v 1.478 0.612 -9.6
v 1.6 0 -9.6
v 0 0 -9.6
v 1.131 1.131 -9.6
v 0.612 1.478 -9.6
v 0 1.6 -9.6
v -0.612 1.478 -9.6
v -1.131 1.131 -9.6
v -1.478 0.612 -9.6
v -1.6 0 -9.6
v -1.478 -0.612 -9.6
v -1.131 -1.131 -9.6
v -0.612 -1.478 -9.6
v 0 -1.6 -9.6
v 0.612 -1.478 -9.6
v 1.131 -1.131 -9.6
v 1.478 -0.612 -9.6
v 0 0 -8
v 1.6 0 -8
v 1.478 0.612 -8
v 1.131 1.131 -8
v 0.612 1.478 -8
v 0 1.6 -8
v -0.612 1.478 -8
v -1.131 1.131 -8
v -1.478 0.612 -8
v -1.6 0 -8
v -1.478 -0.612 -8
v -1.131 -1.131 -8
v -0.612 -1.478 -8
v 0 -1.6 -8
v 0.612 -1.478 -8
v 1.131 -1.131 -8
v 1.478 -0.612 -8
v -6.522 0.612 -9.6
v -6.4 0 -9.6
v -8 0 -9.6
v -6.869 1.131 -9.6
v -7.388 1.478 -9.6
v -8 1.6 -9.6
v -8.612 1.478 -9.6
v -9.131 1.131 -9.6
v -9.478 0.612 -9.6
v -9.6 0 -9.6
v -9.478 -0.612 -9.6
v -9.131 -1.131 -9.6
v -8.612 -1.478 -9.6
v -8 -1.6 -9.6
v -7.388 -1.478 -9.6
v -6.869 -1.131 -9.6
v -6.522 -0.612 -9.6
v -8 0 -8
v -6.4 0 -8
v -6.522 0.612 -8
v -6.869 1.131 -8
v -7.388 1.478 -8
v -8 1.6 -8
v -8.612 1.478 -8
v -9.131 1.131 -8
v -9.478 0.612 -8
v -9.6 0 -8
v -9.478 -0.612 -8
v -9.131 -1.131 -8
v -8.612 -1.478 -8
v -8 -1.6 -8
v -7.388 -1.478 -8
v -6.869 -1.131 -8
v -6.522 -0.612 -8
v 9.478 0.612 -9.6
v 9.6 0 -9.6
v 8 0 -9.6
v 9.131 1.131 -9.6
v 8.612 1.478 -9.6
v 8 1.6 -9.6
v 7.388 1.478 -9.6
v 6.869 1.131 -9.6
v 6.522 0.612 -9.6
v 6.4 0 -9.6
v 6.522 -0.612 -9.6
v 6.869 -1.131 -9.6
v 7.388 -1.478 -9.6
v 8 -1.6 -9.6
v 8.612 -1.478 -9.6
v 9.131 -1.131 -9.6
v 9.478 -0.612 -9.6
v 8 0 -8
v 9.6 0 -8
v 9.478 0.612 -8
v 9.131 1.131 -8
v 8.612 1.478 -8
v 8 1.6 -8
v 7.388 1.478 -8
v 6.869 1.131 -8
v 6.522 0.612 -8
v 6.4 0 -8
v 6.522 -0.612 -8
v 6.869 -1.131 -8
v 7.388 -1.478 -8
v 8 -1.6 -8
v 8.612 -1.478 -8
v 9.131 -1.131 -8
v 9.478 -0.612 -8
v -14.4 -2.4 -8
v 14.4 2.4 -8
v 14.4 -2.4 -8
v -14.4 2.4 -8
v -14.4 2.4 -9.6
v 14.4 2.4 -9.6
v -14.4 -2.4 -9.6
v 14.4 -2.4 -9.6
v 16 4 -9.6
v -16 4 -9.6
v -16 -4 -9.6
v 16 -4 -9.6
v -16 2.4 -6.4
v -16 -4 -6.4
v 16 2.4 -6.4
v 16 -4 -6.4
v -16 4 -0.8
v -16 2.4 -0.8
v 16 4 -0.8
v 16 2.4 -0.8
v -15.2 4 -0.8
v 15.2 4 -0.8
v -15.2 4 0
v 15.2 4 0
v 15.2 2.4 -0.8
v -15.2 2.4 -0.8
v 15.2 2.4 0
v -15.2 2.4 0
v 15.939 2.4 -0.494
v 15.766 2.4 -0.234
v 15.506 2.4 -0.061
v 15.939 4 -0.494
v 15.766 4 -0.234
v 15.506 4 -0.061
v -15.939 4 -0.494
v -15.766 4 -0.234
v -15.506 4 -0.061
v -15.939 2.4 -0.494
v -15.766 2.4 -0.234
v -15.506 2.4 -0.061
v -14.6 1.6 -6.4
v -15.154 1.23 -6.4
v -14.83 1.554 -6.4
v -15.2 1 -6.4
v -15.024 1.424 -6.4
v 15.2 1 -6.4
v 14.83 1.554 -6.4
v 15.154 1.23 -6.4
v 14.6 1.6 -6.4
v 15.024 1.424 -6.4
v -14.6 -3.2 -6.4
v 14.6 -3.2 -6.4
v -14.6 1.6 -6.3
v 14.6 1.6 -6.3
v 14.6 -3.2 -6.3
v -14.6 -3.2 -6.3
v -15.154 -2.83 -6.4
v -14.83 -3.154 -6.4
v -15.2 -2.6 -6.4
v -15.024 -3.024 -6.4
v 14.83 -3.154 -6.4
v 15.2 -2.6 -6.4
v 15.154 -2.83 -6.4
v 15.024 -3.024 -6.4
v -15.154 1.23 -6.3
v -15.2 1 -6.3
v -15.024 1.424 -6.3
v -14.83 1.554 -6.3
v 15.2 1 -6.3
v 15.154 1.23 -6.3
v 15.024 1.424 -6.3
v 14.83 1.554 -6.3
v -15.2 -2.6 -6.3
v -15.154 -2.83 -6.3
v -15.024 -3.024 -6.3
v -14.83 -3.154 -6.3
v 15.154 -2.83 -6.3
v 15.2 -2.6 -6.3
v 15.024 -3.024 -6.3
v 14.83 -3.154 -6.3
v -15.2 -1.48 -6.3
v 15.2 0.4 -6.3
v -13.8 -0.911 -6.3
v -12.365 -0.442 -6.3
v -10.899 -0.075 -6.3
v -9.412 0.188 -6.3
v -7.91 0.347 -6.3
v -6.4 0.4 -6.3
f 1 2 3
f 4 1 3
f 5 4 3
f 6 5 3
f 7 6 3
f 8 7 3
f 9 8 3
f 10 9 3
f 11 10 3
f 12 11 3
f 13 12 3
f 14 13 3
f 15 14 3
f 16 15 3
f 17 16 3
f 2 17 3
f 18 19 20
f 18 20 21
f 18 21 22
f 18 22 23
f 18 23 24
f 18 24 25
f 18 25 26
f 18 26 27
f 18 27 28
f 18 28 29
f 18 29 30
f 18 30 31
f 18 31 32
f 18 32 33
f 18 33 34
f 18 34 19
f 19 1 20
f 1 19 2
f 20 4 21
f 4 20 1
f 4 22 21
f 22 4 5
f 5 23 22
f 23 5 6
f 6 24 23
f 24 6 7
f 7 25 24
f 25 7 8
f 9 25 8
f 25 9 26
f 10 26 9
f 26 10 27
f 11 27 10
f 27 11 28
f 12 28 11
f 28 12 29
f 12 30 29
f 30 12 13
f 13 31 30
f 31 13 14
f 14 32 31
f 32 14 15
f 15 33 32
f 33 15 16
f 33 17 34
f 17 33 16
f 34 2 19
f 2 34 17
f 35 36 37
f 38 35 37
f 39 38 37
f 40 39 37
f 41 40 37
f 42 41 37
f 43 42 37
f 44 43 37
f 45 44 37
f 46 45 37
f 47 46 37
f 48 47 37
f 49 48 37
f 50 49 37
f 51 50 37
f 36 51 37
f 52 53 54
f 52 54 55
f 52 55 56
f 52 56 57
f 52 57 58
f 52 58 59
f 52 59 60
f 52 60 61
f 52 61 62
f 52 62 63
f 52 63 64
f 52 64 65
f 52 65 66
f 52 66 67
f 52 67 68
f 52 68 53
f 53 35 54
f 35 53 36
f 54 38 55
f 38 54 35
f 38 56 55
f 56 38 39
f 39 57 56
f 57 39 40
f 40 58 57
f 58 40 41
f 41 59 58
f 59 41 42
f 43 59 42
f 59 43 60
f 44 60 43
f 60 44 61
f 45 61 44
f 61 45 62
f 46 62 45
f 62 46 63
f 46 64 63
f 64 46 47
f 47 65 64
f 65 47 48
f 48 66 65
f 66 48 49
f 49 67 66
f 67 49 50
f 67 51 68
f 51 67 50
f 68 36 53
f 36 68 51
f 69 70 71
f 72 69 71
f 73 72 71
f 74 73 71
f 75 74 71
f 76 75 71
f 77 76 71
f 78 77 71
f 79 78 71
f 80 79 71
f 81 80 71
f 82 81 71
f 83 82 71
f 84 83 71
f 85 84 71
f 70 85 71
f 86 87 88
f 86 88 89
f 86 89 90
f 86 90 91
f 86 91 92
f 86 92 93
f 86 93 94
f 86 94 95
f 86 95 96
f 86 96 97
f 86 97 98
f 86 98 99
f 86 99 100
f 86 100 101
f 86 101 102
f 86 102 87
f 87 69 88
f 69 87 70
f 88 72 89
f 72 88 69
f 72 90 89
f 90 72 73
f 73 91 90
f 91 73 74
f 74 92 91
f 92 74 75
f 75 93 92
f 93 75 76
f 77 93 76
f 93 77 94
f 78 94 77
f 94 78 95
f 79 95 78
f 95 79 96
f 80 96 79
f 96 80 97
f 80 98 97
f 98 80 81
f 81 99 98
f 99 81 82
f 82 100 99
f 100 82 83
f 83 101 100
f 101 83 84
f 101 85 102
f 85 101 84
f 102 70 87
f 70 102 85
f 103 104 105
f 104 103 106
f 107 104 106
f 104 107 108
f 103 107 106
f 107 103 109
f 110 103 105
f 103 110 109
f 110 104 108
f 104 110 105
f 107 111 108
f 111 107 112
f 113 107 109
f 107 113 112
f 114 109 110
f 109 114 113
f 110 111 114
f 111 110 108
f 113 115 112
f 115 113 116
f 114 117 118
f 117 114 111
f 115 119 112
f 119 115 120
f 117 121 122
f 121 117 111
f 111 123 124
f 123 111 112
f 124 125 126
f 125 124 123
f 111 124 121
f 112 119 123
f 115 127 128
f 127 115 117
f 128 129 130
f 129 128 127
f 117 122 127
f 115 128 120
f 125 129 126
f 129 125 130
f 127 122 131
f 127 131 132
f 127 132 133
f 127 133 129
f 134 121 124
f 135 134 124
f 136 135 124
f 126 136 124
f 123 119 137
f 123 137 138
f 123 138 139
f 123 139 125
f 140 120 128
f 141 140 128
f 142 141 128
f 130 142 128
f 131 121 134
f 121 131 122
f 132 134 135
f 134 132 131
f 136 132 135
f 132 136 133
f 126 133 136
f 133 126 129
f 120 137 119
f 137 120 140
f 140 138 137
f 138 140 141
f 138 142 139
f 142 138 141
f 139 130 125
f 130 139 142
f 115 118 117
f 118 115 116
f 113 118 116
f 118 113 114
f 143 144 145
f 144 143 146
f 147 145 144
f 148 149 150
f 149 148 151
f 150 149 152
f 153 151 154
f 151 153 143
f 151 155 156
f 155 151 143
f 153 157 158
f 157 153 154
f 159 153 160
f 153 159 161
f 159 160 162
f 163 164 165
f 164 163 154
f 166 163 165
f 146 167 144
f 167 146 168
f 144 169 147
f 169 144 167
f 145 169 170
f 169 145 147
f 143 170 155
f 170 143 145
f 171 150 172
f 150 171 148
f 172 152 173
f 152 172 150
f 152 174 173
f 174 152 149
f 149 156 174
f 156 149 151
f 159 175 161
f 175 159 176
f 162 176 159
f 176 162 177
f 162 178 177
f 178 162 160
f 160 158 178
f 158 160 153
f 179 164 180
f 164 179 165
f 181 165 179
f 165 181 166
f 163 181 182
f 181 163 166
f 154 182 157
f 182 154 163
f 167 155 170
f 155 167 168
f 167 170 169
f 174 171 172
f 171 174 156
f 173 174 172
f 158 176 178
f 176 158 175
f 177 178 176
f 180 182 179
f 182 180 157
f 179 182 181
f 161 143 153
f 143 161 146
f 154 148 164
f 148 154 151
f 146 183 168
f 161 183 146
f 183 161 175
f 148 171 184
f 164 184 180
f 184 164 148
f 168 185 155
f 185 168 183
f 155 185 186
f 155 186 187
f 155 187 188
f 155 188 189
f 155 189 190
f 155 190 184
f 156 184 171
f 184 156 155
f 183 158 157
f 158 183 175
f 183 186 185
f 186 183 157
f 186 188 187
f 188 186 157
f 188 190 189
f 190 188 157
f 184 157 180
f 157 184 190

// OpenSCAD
// file: ../p/4-4edge.scad
use <../lib.scad>
function ldraw_lib__4_4edge() = [
// 0 Circle 1.0
// 0 Name: 4-4edge.dat
// 0 Author: James Jessiman
// 0 !LDRAW_ORG Primitive UPDATE 2017-01
// 0 !LICENSE Licensed under CC BY 2.0 and CC BY 4.0 : see CAreadme.txt
// 
// 0 BFC CERTIFY CCW
  [0,"BFC","CERTIFY"],
  [0,"BFC","CCW"],
// 
// 0 !HISTORY 1998-12-15 [PTadmin] Official Update 1998-10
// 0 !HISTORY 2005-12-28 [PTadmin] Official Update 2005-01
// 0 !HISTORY 2007-06-24 [PTadmin] Header formatted for Contributor Agreement
// 0 !HISTORY 2008-07-01 [PTadmin] Official Update 2008-01
// 0 !HISTORY 2017-01-15 [Steffen] BFCed
// 0 !HISTORY 2017-12-30 [PTadmin] Official Update 2017-01
// 
// 
// 2 24 1 0 0 0.9239 0 0.3827
  [2,24,1,0,0,0.9239,0,0.3827],
// 2 24 0.9239 0 0.3827 0.7071 0 0.7071
  [2,24,0.9239,0,0.3827,0.7071,0,0.7071],
// 2 24 0.7071 0 0.7071 0.3827 0 0.9239
  [2,24,0.7071,0,0.7071,0.3827,0,0.9239],
// 2 24 0.3827 0 0.9239 0 0 1
  [2,24,0.3827,0,0.9239,0,0,1],
// 2 24 0 0 1 -0.3827 0 0.9239
  [2,24,0,0,1,-0.3827,0,0.9239],
// 2 24 -0.3827 0 0.9239 -0.7071 0 0.7071
  [2,24,-0.3827,0,0.9239,-0.7071,0,0.7071],
// 2 24 -0.7071 0 0.7071 -0.9239 0 0.3827
  [2,24,-0.7071,0,0.7071,-0.9239,0,0.3827],
// 2 24 -0.9239 0 0.3827 -1 0 -0
  [2,24,-0.9239,0,0.3827,-1,0,-0],
// 2 24 -1 0 -0 -0.9239 0 -0.3827
  [2,24,-1,0,-0,-0.9239,0,-0.3827],
// 2 24 -0.9239 0 -0.3827 -0.7071 0 -0.7071
  [2,24,-0.9239,0,-0.3827,-0.7071,0,-0.7071],
// 2 24 -0.7071 0 -0.7071 -0.3827 0 -0.9239
  [2,24,-0.7071,0,-0.7071,-0.3827,0,-0.9239],
// 2 24 -0.3827 0 -0.9239 0 0 -1
  [2,24,-0.3827,0,-0.9239,0,0,-1],
// 2 24 0 0 -1 0.3827 0 -0.9239
  [2,24,0,0,-1,0.3827,0,-0.9239],
// 2 24 0.3827 0 -0.9239 0.7071 0 -0.7071
  [2,24,0.3827,0,-0.9239,0.7071,0,-0.7071],
// 2 24 0.7071 0 -0.7071 0.9239 0 -0.3827
  [2,24,0.7071,0,-0.7071,0.9239,0,-0.3827],
// 2 24 0.9239 0 -0.3827 1 0 0
  [2,24,0.9239,0,-0.3827,1,0,0],
];
module ldraw_lib__4_4edge(step=0, col=false, unit=2/5, alt=false, line=0.2, solid=!$preview)
    makepoly(ldraw_lib__4_4edge(), step=step, col=col, unit=unit, alt=alt, line=line, solid=solid);
ldraw_lib__4_4edge(line=0.2);
// file: ../p/4-4disc.scad
use <../lib.scad>
function ldraw_lib__4_4disc() = [
// 0 Disc 1.0
// 0 Name: 4-4disc.dat
// 0 Author: James Jessiman
// 0 !LDRAW_ORG Primitive UPDATE 2002-02
// 0 !LICENSE Licensed under CC BY 2.0 and CC BY 4.0 : see CAreadme.txt
// 
// 0 BFC CERTIFY CCW
  [0,"BFC","CERTIFY"],
  [0,"BFC","CCW"],
// 
// 0 !HISTORY 1998-12-15 [PTadmin] Official Update 1998-10
// 0 !HISTORY 2002-03-23 [sbliss] Added BFC statement
// 0 !HISTORY 2002-04-25 [PTadmin] Official Update 2002-02
// 0 !HISTORY 2007-06-24 [PTadmin] Header formatted for Contributor Agreement
// 0 !HISTORY 2008-07-01 [PTadmin] Official Update 2008-01
// 
// 
// 3 16 0 0 0 1 0 0 0.9239 0 0.3827
  [3,16,0,0,0,1,0,0,0.9239,0,0.3827],
// 3 16 0 0 0 0.9239 0 0.3827 0.7071 0 0.7071
  [3,16,0,0,0,0.9239,0,0.3827,0.7071,0,0.7071],
// 3 16 0 0 0 0.7071 0 0.7071 0.3827 0 0.9239
  [3,16,0,0,0,0.7071,0,0.7071,0.3827,0,0.9239],
// 3 16 0 0 0 0.3827 0 0.9239 0 0 1
  [3,16,0,0,0,0.3827,0,0.9239,0,0,1],
// 3 16 0 0 0 0 0 1 -0.3827 0 0.9239
  [3,16,0,0,0,0,0,1,-0.3827,0,0.9239],
// 3 16 0 0 0 -0.3827 0 0.9239 -0.7071 0 0.7071
  [3,16,0,0,0,-0.3827,0,0.9239,-0.7071,0,0.7071],
// 3 16 0 0 0 -0.7071 0 0.7071 -0.9239 0 0.3827
  [3,16,0,0,0,-0.7071,0,0.7071,-0.9239,0,0.3827],
// 3 16 0 0 0 -0.9239 0 0.3827 -1 0 -0
  [3,16,0,0,0,-0.9239,0,0.3827,-1,0,-0],
// 3 16 0 0 0 -1 0 -0 -0.9239 0 -0.3827
  [3,16,0,0,0,-1,0,-0,-0.9239,0,-0.3827],
// 3 16 0 0 0 -0.9239 0 -0.3827 -0.7071 0 -0.7071
  [3,16,0,0,0,-0.9239,0,-0.3827,-0.7071,0,-0.7071],
// 3 16 0 0 0 -0.7071 0 -0.7071 -0.3827 0 -0.9239
  [3,16,0,0,0,-0.7071,0,-0.7071,-0.3827,0,-0.9239],
// 3 16 0 0 0 -0.3827 0 -0.9239 0 0 -1
  [3,16,0,0,0,-0.3827,0,-0.9239,0,0,-1],
// 3 16 0 0 0 0 0 -1 0.3827 0 -0.9239
  [3,16,0,0,0,0,0,-1,0.3827,0,-0.9239],
// 3 16 0 0 0 0.3827 0 -0.9239 0.7071 0 -0.7071
  [3,16,0,0,0,0.3827,0,-0.9239,0.7071,0,-0.7071],
// 3 16 0 0 0 0.7071 0 -0.7071 0.9239 0 -0.3827
  [3,16,0,0,0,0.7071,0,-0.7071,0.9239,0,-0.3827],
// 3 16 0 0 0 0.9239 0 -0.3827 1 0 0
  [3,16,0,0,0,0.9239,0,-0.3827,1,0,0],
// 0
];
module ldraw_lib__4_4disc(step=0, col=false, unit=2/5, alt=false, line=0.2, solid=!$preview)
    makepoly(ldraw_lib__4_4disc(), step=step, col=col, unit=unit, alt=alt, line=line, solid=solid);
ldraw_lib__4_4disc(line=0.2);
// file: ../p/4-4cyli.scad
use <../lib.scad>
$fa=1; $fs=0.2;
function ldraw_lib__4_4cyli(realsolid=false) = [
// 0 Cylinder 1.0
// 0 Name: 4-4cyli.dat
// 0 Author: James Jessiman
// 0 !LDRAW_ORG Primitive UPDATE 2005-01
// 0 !LICENSE Licensed under CC BY 2.0 and CC BY 4.0 : see CAreadme.txt
// 
// 0 BFC CERTIFY CCW
  [0,"BFC","CERTIFY"],
  [0,"BFC","CCW"],
// 
// 0 !HISTORY 1998-12-15 [PTadmin] Official Update 1998-10
// 0 !HISTORY 2002-03-23 [sbliss] Added BFC statement; merged headers from files in distributions LDraw 0.27 and Complete.
// 0 !HISTORY 2002-04-25 [PTadmin] Official Update 2002-02
// 0 !HISTORY 2004-12-14 [guyvivan] BFC CCW
// 0 !HISTORY 2005-12-28 [PTadmin] Official Update 2005-01
// 0 !HISTORY 2007-06-24 [PTadmin] Header formatted for Contributor Agreement
// 0 !HISTORY 2008-07-01 [PTadmin] Official Update 2008-01
// 
// 
// 4 16 1 1 0 0.9239 1 0.3827 0.9239 0 0.3827 1 0 0
  [4,16,1,1,0,0.9239,1,0.3827,0.9239,0,0.3827,1,0,0],
// 5 24 1 0 0 1 1 0 0.9239 0 0.3827 0.9239 0 -0.3827
  [5,24,1,0,0,1,1,0,0.9239,0,0.3827,0.9239,0,-0.3827],
// 4 16 0.9239 1 0.3827 0.7071 1 0.7071 0.7071 0 0.7071 0.9239 0 0.3827
  [4,16,0.9239,1,0.3827,0.7071,1,0.7071,0.7071,0,0.7071,0.9239,0,0.3827],
// 5 24 0.9239 0 0.3827 0.9239 1 0.3827 0.7071 0 0.7071 1 0 0
  [5,24,0.9239,0,0.3827,0.9239,1,0.3827,0.7071,0,0.7071,1,0,0],
// 4 16 0.7071 1 0.7071 0.3827 1 0.9239 0.3827 0 0.9239 0.7071 0 0.7071
  [4,16,0.7071,1,0.7071,0.3827,1,0.9239,0.3827,0,0.9239,0.7071,0,0.7071],
// 5 24 0.7071 0 0.7071 0.7071 1 0.7071 0.3827 0 0.9239 0.9239 0 0.3827
  [5,24,0.7071,0,0.7071,0.7071,1,0.7071,0.3827,0,0.9239,0.9239,0,0.3827],
// 4 16 0.3827 1 0.9239 0 1 1 0 0 1 0.3827 0 0.9239
  [4,16,0.3827,1,0.9239,0,1,1,0,0,1,0.3827,0,0.9239],
// 5 24 0.3827 0 0.9239 0.3827 1 0.9239 0 0 1 0.7071 0 0.7071
  [5,24,0.3827,0,0.9239,0.3827,1,0.9239,0,0,1,0.7071,0,0.7071],
// 4 16 0 1 1 -0.3827 1 0.9239 -0.3827 0 0.9239 0 0 1
  [4,16,0,1,1,-0.3827,1,0.9239,-0.3827,0,0.9239,0,0,1],
// 5 24 0 0 1 0 1 1 -0.3827 0 0.9239 0.3827 0 0.9239
  [5,24,0,0,1,0,1,1,-0.3827,0,0.9239,0.3827,0,0.9239],
// 4 16 -0.3827 1 0.9239 -0.7071 1 0.7071 -0.7071 0 0.7071 -0.3827 0 0.9239
  [4,16,-0.3827,1,0.9239,-0.7071,1,0.7071,-0.7071,0,0.7071,-0.3827,0,0.9239],
// 5 24 -0.3827 0 0.9239 -0.3827 1 0.9239 -0.7071 0 0.7071 0 0 1
  [5,24,-0.3827,0,0.9239,-0.3827,1,0.9239,-0.7071,0,0.7071,0,0,1],
// 4 16 -0.7071 1 0.7071 -0.9239 1 0.3827 -0.9239 0 0.3827 -0.7071 0 0.7071
  [4,16,-0.7071,1,0.7071,-0.9239,1,0.3827,-0.9239,0,0.3827,-0.7071,0,0.7071],
// 5 24 -0.7071 0 0.7071 -0.7071 1 0.7071 -0.9239 0 0.3827 -0.3827 0 0.9239
  [5,24,-0.7071,0,0.7071,-0.7071,1,0.7071,-0.9239,0,0.3827,-0.3827,0,0.9239],
// 4 16 -0.9239 1 0.3827 -1 1 0 -1 0 0 -0.9239 0 0.3827
  [4,16,-0.9239,1,0.3827,-1,1,0,-1,0,0,-0.9239,0,0.3827],
// 5 24 -0.9239 0 0.3827 -0.9239 1 0.3827 -1 0 0 -0.7071 0 0.7071
  [5,24,-0.9239,0,0.3827,-0.9239,1,0.3827,-1,0,0,-0.7071,0,0.7071],
// 4 16 -1 1 0 -0.9239 1 -0.3827 -0.9239 0 -0.3827 -1 0 0
  [4,16,-1,1,0,-0.9239,1,-0.3827,-0.9239,0,-0.3827,-1,0,0],
// 5 24 -1 0 0 -1 1 0 -0.9239 0 -0.3827 -0.9239 0 0.3827
  [5,24,-1,0,0,-1,1,0,-0.9239,0,-0.3827,-0.9239,0,0.3827],
// 4 16 -0.9239 1 -0.3827 -0.7071 1 -0.7071 -0.7071 0 -0.7071 -0.9239 0 -0.3827
  [4,16,-0.9239,1,-0.3827,-0.7071,1,-0.7071,-0.7071,0,-0.7071,-0.9239,0,-0.3827],
// 5 24 -0.9239 0 -0.3827 -0.9239 1 -0.3827 -0.7071 0 -0.7071 -1 0 0
  [5,24,-0.9239,0,-0.3827,-0.9239,1,-0.3827,-0.7071,0,-0.7071,-1,0,0],
// 4 16 -0.7071 1 -0.7071 -0.3827 1 -0.9239 -0.3827 0 -0.9239 -0.7071 0 -0.7071
  [4,16,-0.7071,1,-0.7071,-0.3827,1,-0.9239,-0.3827,0,-0.9239,-0.7071,0,-0.7071],
// 5 24 -0.7071 0 -0.7071 -0.7071 1 -0.7071 -0.3827 0 -0.9239 -0.9239 0 -0.3827
  [5,24,-0.7071,0,-0.7071,-0.7071,1,-0.7071,-0.3827,0,-0.9239,-0.9239,0,-0.3827],
// 4 16 -0.3827 1 -0.9239 0 1 -1 0 0 -1 -0.3827 0 -0.9239
  [4,16,-0.3827,1,-0.9239,0,1,-1,0,0,-1,-0.3827,0,-0.9239],
// 5 24 -0.3827 0 -0.9239 -0.3827 1 -0.9239 0 0 -1 -0.7071 0 -0.7071
  [5,24,-0.3827,0,-0.9239,-0.3827,1,-0.9239,0,0,-1,-0.7071,0,-0.7071],
// 4 16 0 1 -1 0.3827 1 -0.9239 0.3827 0 -0.9239 0 0 -1
  [4,16,0,1,-1,0.3827,1,-0.9239,0.3827,0,-0.9239,0,0,-1],
// 5 24 0 0 -1 0 1 -1 0.3827 0 -0.9239 -0.3827 0 -0.9239
  [5,24,0,0,-1,0,1,-1,0.3827,0,-0.9239,-0.3827,0,-0.9239],
// 4 16 0.3827 1 -0.9239 0.7071 1 -0.7071 0.7071 0 -0.7071 0.3827 0 -0.9239
  [4,16,0.3827,1,-0.9239,0.7071,1,-0.7071,0.7071,0,-0.7071,0.3827,0,-0.9239],
// 5 24 0.3827 0 -0.9239 0.3827 1 -0.9239 0.7071 0 -0.7071 0 0 -1
  [5,24,0.3827,0,-0.9239,0.3827,1,-0.9239,0.7071,0,-0.7071,0,0,-1],
// 4 16 0.7071 1 -0.7071 0.9239 1 -0.3827 0.9239 0 -0.3827 0.7071 0 -0.7071
  [4,16,0.7071,1,-0.7071,0.9239,1,-0.3827,0.9239,0,-0.3827,0.7071,0,-0.7071],
// 5 24 0.7071 0 -0.7071 0.7071 1 -0.7071 0.9239 0 -0.3827 0.3827 0 -0.9239
  [5,24,0.7071,0,-0.7071,0.7071,1,-0.7071,0.9239,0,-0.3827,0.3827,0,-0.9239],
// 4 16 0.9239 1 -0.3827 1 1 0 1 0 0 0.9239 0 -0.3827
  [4,16,0.9239,1,-0.3827,1,1,0,1,0,0,0.9239,0,-0.3827],
// 5 24 0.9239 0 -0.3827 0.9239 1 -0.3827 1 0 0 0.7071 0 -0.7071
  [5,24,0.9239,0,-0.3827,0.9239,1,-0.3827,1,0,0,0.7071,0,-0.7071],
// 0
];
module ldraw_lib__4_4cyli(step=0, col=false, unit=2/5, alt=false, line=0.2, solid=!$preview)
    makepoly(ldraw_lib__4_4cyli(solid), step=step, col=col, unit=unit, alt=alt, line=line, solid=solid);
ldraw_lib__4_4cyli(line=0.2);
// file: ../p/1-4edge.scad
use <../lib.scad>
$fa=1; $fs=0.2;
function ldraw_lib__1_4edge(realsolid=false) = [
// 0 Circle 0.25
// 0 Name: 1-4edge.dat
// 0 Author: James Jessiman
// 0 !LDRAW_ORG Primitive UPDATE 2017-01
// 0 !LICENSE Licensed under CC BY 2.0 and CC BY 4.0 : see CAreadme.txt
// 
// 0 BFC CERTIFY CCW
  [0,"BFC","CERTIFY"],
  [0,"BFC","CCW"],
// 
// 0 !HISTORY 2007-06-22 [PTadmin] Header formatted for Contributor Agreement
// 0 !HISTORY 2008-07-01 [PTadmin] Official Update 2008-01
// 0 !HISTORY 2017-01-15 [Steffen] BFCed
// 0 !HISTORY 2017-12-30 [PTadmin] Official Update 2017-01
// 
// 
// 2 24 1 0 0 0.9239 0 0.3827
  [2,24,1,0,0,0.9239,0,0.3827],
// 2 24 0.9239 0 0.3827 0.7071 0 0.7071
  [2,24,0.9239,0,0.3827,0.7071,0,0.7071],
// 2 24 0.7071 0 0.7071 0.3827 0 0.9239
  [2,24,0.7071,0,0.7071,0.3827,0,0.9239],
// 2 24 0.3827 0 0.9239 0 0 1
  [2,24,0.3827,0,0.9239,0,0,1],
];
module ldraw_lib__1_4edge(step=0, col=false, unit=2/5, alt=false, line=0.2, solid=!$preview)
    makepoly(ldraw_lib__1_4edge(solid), step=step, col=col, unit=unit, alt=alt, line=line, solid=solid);
ldraw_lib__1_4edge(line=0.2);
// file: ../p/box3u12.scad
use <../lib.scad>
function ldraw_lib__box3u12() = [
// 0 Box with 3 Parallel Faces without Any Edges
// 0 Name: box3u12.dat
// 0 Author: J.C. Tchang [tchang]
// 0 !LDRAW_ORG Primitive UPDATE 2014-02
// 0 !LICENSE Licensed under CC BY 2.0 and CC BY 4.0 : see CAreadme.txt
// 
// 0 BFC CERTIFY CCW
  [0,"BFC","CERTIFY"],
  [0,"BFC","CCW"],
// 
// 0 !HISTORY 2014-12-23 [PTadmin] Official Update 2014-02
// 
// 
// 4 16 -1 1 1 1 1 1 1 1 -1 -1 1 -1
  [4,16,-1,1,1,1,1,1,1,1,-1,-1,1,-1],
// 4 16 -1 1 1 -1 0 1 1 0 1 1 1 1
  [4,16,-1,1,1,-1,0,1,1,0,1,1,1,1],
// 4 16 1 1 -1 1 0 -1 -1 0 -1 -1 1 -1
  [4,16,1,1,-1,1,0,-1,-1,0,-1,-1,1,-1],
];
makepoly(ldraw_lib__box3u12(), line=0.2);
// file: ../p/1-4cyli.scad
use <../lib.scad>
function ldraw_lib__1_4cyli() = [
// 0 Cylinder 0.25
// 0 Name: 1-4cyli.dat
// 0 Author: James Jessiman
// 0 !LDRAW_ORG Primitive UPDATE 2012-01
// 0 !LICENSE Licensed under CC BY 2.0 and CC BY 4.0 : see CAreadme.txt
// 
// 0 BFC CERTIFY CCW
  [0,"BFC","CERTIFY"],
  [0,"BFC","CCW"],
// 
// 0 !HISTORY 2002-03-23 [sbliss] Added BFC statement.
// 0 !HISTORY 2002-04-25 [PTadmin] Official Update 2002-02
// 0 !HISTORY 2007-06-22 [PTadmin] Header formatted for Contributor Agreement
// 0 !HISTORY 2008-07-01 [PTadmin] Official Update 2008-01
// 0 !HISTORY 2012-02-16 [Philo] Changed to CCW
// 0 !HISTORY 2012-03-30 [PTadmin] Official Update 2012-01
// 
// 
// 4 16 1 1 0 0.9239 1 0.3827 0.9239 0 0.3827 1 0 0
  [4,16,1,1,0,0.9239,1,0.3827,0.9239,0,0.3827,1,0,0],
// 5 24 1 0 0 1 1 0 0.9239 0 0.3827 1 0 -1
  [5,24,1,0,0,1,1,0,0.9239,0,0.3827,1,0,-1],
// 4 16 0.9239 1 0.3827 0.7071 1 0.7071 0.7071 0 0.7071 0.9239 0 0.3827
  [4,16,0.9239,1,0.3827,0.7071,1,0.7071,0.7071,0,0.7071,0.9239,0,0.3827],
// 5 24 0.9239 0 0.3827 0.9239 1 0.3827 0.7071 0 0.7071 1 0 0
  [5,24,0.9239,0,0.3827,0.9239,1,0.3827,0.7071,0,0.7071,1,0,0],
// 4 16 0.7071 1 0.7071 0.3827 1 0.9239 0.3827 0 0.9239 0.7071 0 0.7071
  [4,16,0.7071,1,0.7071,0.3827,1,0.9239,0.3827,0,0.9239,0.7071,0,0.7071],
// 5 24 0.7071 0 0.7071 0.7071 1 0.7071 0.3827 0 0.9239 0.9239 0 0.3827
  [5,24,0.7071,0,0.7071,0.7071,1,0.7071,0.3827,0,0.9239,0.9239,0,0.3827],
// 4 16 0.3827 1 0.9239 0 1 1 0 0 1 0.3827 0 0.9239
  [4,16,0.3827,1,0.9239,0,1,1,0,0,1,0.3827,0,0.9239],
// 5 24 0.3827 0 0.9239 0.3827 1 0.9239 0 0 1 0.7071 0 0.7071
  [5,24,0.3827,0,0.9239,0.3827,1,0.9239,0,0,1,0.7071,0,0.7071],
// 5 24 0 0 1 0 1 1 0.3827 0 0.9239 -1 0 1
  [5,24,0,0,1,0,1,1,0.3827,0,0.9239,-1,0,1],
];
module ldraw_lib__1_4cyli(step=0, col=false, unit=2/5, alt=false, line=0.2, solid=!$preview)
    makepoly(ldraw_lib__1_4cyli(), step=step, col=col, unit=unit, alt=alt, line=line, solid=solid);
ldraw_lib__1_4cyli(line=0.2);
// file: ../p/1-4chrd.scad
use <../lib.scad>
$fa=1; $fs=0.2;
function ldraw_lib__1_4chrd(realsolid=false) = [
// 0 Chord 0.25
// 0 Name: 1-4chrd.dat
// 0 Author: Tony Hafner [hafhead]
// 0 !LDRAW_ORG Primitive UPDATE 2012-02
// 0 !LICENSE Licensed under CC BY 2.0 and CC BY 4.0 : see CAreadme.txt
// 
// 0 BFC CERTIFY CCW
  [0,"BFC","CERTIFY"],
  [0,"BFC","CCW"],
// 
// 0 !HISTORY 2004-04-22 [PTadmin] Official Update 2004-02
// 0 !HISTORY 2007-10-09 [PTadmin] Header formatted for Contributor Agreement
// 0 !HISTORY 2008-07-01 [PTadmin] Official Update 2008-01
// 0 !HISTORY 2012-08-02 [MMR1988] Re-creation with PrimGen2 and Rectifier
// 0 !HISTORY 2012-08-09 [PTadmin] Official Update 2012-02
// 
// 
// 4 16 0.9239 0 0.3827 0.3827 0 0.9239 0 0 1 1 0 0
  [4,16,0.9239,0,0.3827,0.3827,0,0.9239,0,0,1,1,0,0],
// 3 16 0.7071 0 0.7071 0.3827 0 0.9239 0.9239 0 0.3827
  [3,16,0.7071,0,0.7071,0.3827,0,0.9239,0.9239,0,0.3827],
];
module ldraw_lib__1_4chrd(step=0, col=false, unit=2/5, alt=false, line=0.2, solid=!$preview)
    makepoly(ldraw_lib__1_4chrd(solid), step=step, col=col, unit=unit, alt=alt, line=line, solid=solid);
ldraw_lib__1_4chrd(line=0.2);
// file: ../p/stud3.scad
use <../lib.scad>
use <4-4cyli.scad>
use <4-4disc.scad>
use <4-4edge.scad>
function ldraw_lib__stud3() = [
// 0 Stud Tube Solid
// 0 Name: stud3.dat
// 0 Author: James Jessiman
// 0 !LDRAW_ORG Primitive UPDATE 2012-01
// 0 !LICENSE Licensed under CC BY 4.0 : see CAreadme.txt
// 
// 0 BFC CERTIFY CCW
  [0,"BFC","CERTIFY"],
  [0,"BFC","CCW"],
// 
// 0 !HISTORY 2002-04-04 [sbliss] Modified for BFC compliance
// 0 !HISTORY 2002-04-25 [PTadmin] Official Update 2002-02
// 0 !HISTORY 2007-06-24 [PTadmin] Header formatted for Contributor Agreement
// 0 !HISTORY 2008-07-01 [PTadmin] Official Update 2008-01
// 0 !HISTORY 2012-02-16 [Philo] Changed to CCW
// 0 !HISTORY 2012-03-30 [PTadmin] Official Update 2012-01
// 
// 
// 1 16 0 -4 0 4 0 0 0 1 0 0 0 4 4-4edge.dat
  [1,16,0,-4,0,4,0,0,0,1,0,0,0,4, ldraw_lib__4_4edge()],
// 1 16 0 0 0 4 0 0 0 1 0 0 0 4 4-4edge.dat
  [1,16,0,0,0,4,0,0,0,1,0,0,0,4, ldraw_lib__4_4edge()],
// 1 16 0 -4 0 4 0 0 0 1 0 0 0 4 4-4disc.dat
  [1,16,0,-4,0,4,0,0,0,1,0,0,0,4, ldraw_lib__4_4disc()],
  [-1,16,0,0,0,4,0,0,0,-1,0,0,0,4, ldraw_lib__4_4disc()],
// 1 16 0 -4 0 4 0 0 0 4 0 0 0 4 4-4cyli.dat
  [1,16,0,-4,0,4,0,0,0,4,0,0,0,4, ldraw_lib__4_4cyli()],
];
module ldraw_lib__stud3(step=0, col=false, unit=2/5, alt=false, line=0.2, solid=!$preview)
    makepoly(ldraw_lib__stud3(), step=step, col=col, unit=unit, alt=alt, line=line, solid=solid);
ldraw_lib__stud3(line=0.2);
// file: ../p/box5.scad
use <../lib.scad>
function ldraw_lib__box5() = [
// 0 Box with 5 Faces and All Edges
// 0 Name: box5.dat
// 0 Author: James Jessiman
// 0 !LDRAW_ORG Primitive UPDATE 2012-01
// 0 !LICENSE Licensed under CC BY 2.0 and CC BY 4.0 : see CAreadme.txt
// 
// 0 BFC CERTIFY CCW
  [0,"BFC","CERTIFY"],
  [0,"BFC","CCW"],
// 
// 0 !HISTORY 2002-04-03 [sbliss] Modified for BFC compliance
// 0 !HISTORY 2002-04-25 [PTadmin] Official Update 2002-02
// 0 !HISTORY 2007-06-24 [PTadmin] Header formatted for Contributor Agreement
// 0 !HISTORY 2008-07-01 [PTadmin] Official Update 2008-01
// 0 !HISTORY 2012-02-16 [Philo] Changed to CCW
// 0 !HISTORY 2012-03-30 [PTadmin] Official Update 2012-01
// 
// 
// 2 24 1 1 1 -1 1 1
  [2,24,1,1,1,-1,1,1],
// 2 24 -1 1 1 -1 1 -1
  [2,24,-1,1,1,-1,1,-1],
// 2 24 -1 1 -1 1 1 -1
  [2,24,-1,1,-1,1,1,-1],
// 2 24 1 1 -1 1 1 1
  [2,24,1,1,-1,1,1,1],
// 2 24 1 0 1 -1 0 1
  [2,24,1,0,1,-1,0,1],
// 2 24 -1 0 1 -1 0 -1
  [2,24,-1,0,1,-1,0,-1],
// 2 24 -1 0 -1 1 0 -1
  [2,24,-1,0,-1,1,0,-1],
// 2 24 1 0 -1 1 0 1
  [2,24,1,0,-1,1,0,1],
// 2 24 1 0 1 1 1 1
  [2,24,1,0,1,1,1,1],
// 2 24 -1 0 1 -1 1 1
  [2,24,-1,0,1,-1,1,1],
// 2 24 1 0 -1 1 1 -1
  [2,24,1,0,-1,1,1,-1],
// 2 24 -1 0 -1 -1 1 -1
  [2,24,-1,0,-1,-1,1,-1],
// 4 16 -1 1 1 1 1 1 1 1 -1 -1 1 -1
  [4,16,-1,1,1,1,1,1,1,1,-1,-1,1,-1],
// 4 16 -1 1 1 -1 0 1 1 0 1 1 1 1
  [4,16,-1,1,1,-1,0,1,1,0,1,1,1,1],
// 4 16 -1 1 -1 -1 0 -1 -1 0 1 -1 1 1
  [4,16,-1,1,-1,-1,0,-1,-1,0,1,-1,1,1],
// 4 16 1 1 -1 1 0 -1 -1 0 -1 -1 1 -1
  [4,16,1,1,-1,1,0,-1,-1,0,-1,-1,1,-1],
// 4 16 1 1 1 1 0 1 1 0 -1 1 1 -1
  [4,16,1,1,1,1,0,1,1,0,-1,1,1,-1],
];
makepoly(ldraw_lib__box5(), line=0.2);
// file: ../p/box2-5.scad
use <../lib.scad>
$fa=1; $fs=0.2;
function ldraw_lib__box2_5(realsolid=false) = [
// 0 Box with 2 Faces without 5 Edges
// 0 Name: box2-5.dat
// 0 Author: Steffen [Steffen]
// 0 !LDRAW_ORG Primitive UPDATE 2003-03
// 0 !LICENSE Licensed under CC BY 2.0 and CC BY 4.0 : see CAreadme.txt
// 
// 0 BFC CERTIFY CCW
  [0,"BFC","CERTIFY"],
  [0,"BFC","CCW"],
// 
// 0 !HISTORY 2003-12-19 [PTadmin] Official Update 2003-03
// 0 !HISTORY 2007-06-24 [PTadmin] Header formatted for Contributor Agreement
// 0 !HISTORY 2008-07-01 [PTadmin] Official Update 2008-01
// 
// 
// 2 24 1 1 1 -1 1 1
  [2,24,1,1,1,-1,1,1],
// 2 24 1 1 -1 -1 1 -1
  [2,24,1,1,-1,-1,1,-1],
// 2 24 1 -1 1 -1 -1 1
  [2,24,1,-1,1,-1,-1,1],
// 2 24 -1 -1 1 -1 1 1
  [2,24,-1,-1,1,-1,1,1],
// 2 24 1 -1 1 1 1 1
  [2,24,1,-1,1,1,1,1],
// 2 24 -1 1 -1 -1 1 1
  [2,24,-1,1,-1,-1,1,1],
// 2 24 1 1 -1 1 1 1
  [2,24,1,1,-1,1,1,1],
// 4 16 1 1 1 1 1 -1 -1 1 -1 -1 1 1
  [4,16,1,1,1,1,1,-1,-1,1,-1,-1,1,1],
// 4 16 1 1 1 -1 1 1 -1 -1 1 1 -1 1
  [4,16,1,1,1,-1,1,1,-1,-1,1,1,-1,1],
// 0
];
module ldraw_lib__box2_5(step=0, col=false, unit=2/5, alt=false, line=0.2, solid=!$preview)
    makepoly(ldraw_lib__box2_5(solid), step=step, col=col, unit=unit, alt=alt, line=line, solid=solid);
ldraw_lib__box2_5(line=0.2);
// file: ../p/1-4disc.scad
use <../lib.scad>
function ldraw_lib__1_4disc() = [
// 0 Disc 0.25
// 0 Name: 1-4disc.dat
// 0 Author: James Jessiman
// 0 !LDRAW_ORG Primitive UPDATE 2002-02
// 0 !LICENSE Licensed under CC BY 2.0 and CC BY 4.0 : see CAreadme.txt
// 
// 0 BFC CERTIFY CCW
  [0,"BFC","CERTIFY"],
  [0,"BFC","CCW"],
// 
// 0 !HISTORY 2002-03-23 [sbliss] Added BFC statement.
// 0 !HISTORY 2002-04-25 [PTadmin] Official Update 2002-02
// 0 !HISTORY 2007-06-22 [PTadmin] Header formatted for Contributor Agreement
// 0 !HISTORY 2008-07-01 [PTadmin] Official Update 2008-01
// 
// 
// 3 16 0 0 0 1 0 0 0.9239 0 0.3827
  [3,16,0,0,0,1,0,0,0.9239,0,0.3827],
// 3 16 0 0 0 0.9239 0 0.3827 0.7071 0 0.7071
  [3,16,0,0,0,0.9239,0,0.3827,0.7071,0,0.7071],
// 3 16 0 0 0 0.7071 0 0.7071 0.3827 0 0.9239
  [3,16,0,0,0,0.7071,0,0.7071,0.3827,0,0.9239],
// 3 16 0 0 0 0.3827 0 0.9239 0 0 1
  [3,16,0,0,0,0.3827,0,0.9239,0,0,1],
// 0
];
makepoly(ldraw_lib__1_4disc(), line=0.2);
// file: ../p/1-4cylo.scad
use <../lib.scad>
use <1-4cyli.scad>
use <1-4edge.scad>
$fa=1; $fs=0.2;
function ldraw_lib__1_4cylo(realsolid=false) = [
// 0 Cylinder Open 0.25
// 0 Name: 1-4cylo.dat
// 0 Author: Max Martin Richter [MMR1988]
// 0 !LDRAW_ORG Primitive UPDATE 2010-03
// 0 !LICENSE Licensed under CC BY 2.0 and CC BY 4.0 : see CAreadme.txt
// 
// 0 BFC CERTIFY CCW
  [0,"BFC","CERTIFY"],
  [0,"BFC","CCW"],
// 
// 0 !HISTORY 2010-12-31 [PTadmin] Official Update 2010-03
// 
// 
// 1 16 0 0 0 1 0 0 0 1 0 0 0 1 1-4edge.dat
  [1,16,0,0,0,1,0,0,0,1,0,0,0,1, ldraw_lib__1_4edge(realsolid)],
// 1 16 0 1 0 1 0 0 0 1 0 0 0 1 1-4edge.dat
  [1,16,0,1,0,1,0,0,0,1,0,0,0,1, ldraw_lib__1_4edge(realsolid)],
// 1 16 0 0 0 1 0 0 0 1 0 0 0 1 1-4cyli.dat
  [1,16,0,0,0,1,0,0,0,1,0,0,0,1, ldraw_lib__1_4cyli(realsolid)],
];
module ldraw_lib__1_4cylo(step=0, col=false, unit=2/5, alt=false, line=0.2, solid=!$preview)
    makepoly(ldraw_lib__1_4cylo(solid), step=step, col=col, unit=unit, alt=alt, line=line, solid=solid);
ldraw_lib__1_4cylo(line=0.2);
// file: 6221655r.scad
use <../lib.scad>
use <../p/1-4chrd.scad>
use <../p/1-4cyli.scad>
use <../p/box3u12.scad>
function ldraw_lib__6221655r() = [
// 0 Sticker  0.6 x  3.8 with Red Stripe on Black Background Right
// 0 Name: 6221655r.dat
// 0 Author: Massimo Maso [Sirio]
// 0 !LDRAW_ORG Part UPDATE 2024-09
// 0 !LICENSE Licensed under CC BY 4.0 : see CAreadme.txt
// 
// 0 BFC CERTIFY CCW
  [0,"BFC","CERTIFY"],
  [0,"BFC","CCW"],
// 
// 0 !KEYWORDS 3.0, 911 RSR, Porsche, Set 75888, Speed Champions, Turbo
// 
// 0 !HISTORY 2024-10-27 [OrionP] Official Update 2024-09
// 
// 0 // Primitives
// 1 16 -36.5 0 4.5 -1.5 0 0 0 -1 0 0 0 1.5 1-4chrd.dat
  [1,16,-36.5,0,4.5,-1.5,0,0,0,-1,0,0,0,1.5, ldraw_lib__1_4chrd()],
// 1 16 36.5 0 4.5 1.5 0 0 0 -1 0 0 0 1.5 1-4chrd.dat
  [1,16,36.5,0,4.5,1.5,0,0,0,-1,0,0,0,1.5, ldraw_lib__1_4chrd()],
// 1 16 0 -.25 0 36.5 0 0 0 .25 0 0 0 6 box3u12.dat
  [1,16,0,-.25,0,36.5,0,0,0,.25,0,0,0,6, ldraw_lib__box3u12()],
// 1 16 -36.5 0 -4.5 -1.5 0 0 0 -1 0 0 0 -1.5 1-4chrd.dat
  [1,16,-36.5,0,-4.5,-1.5,0,0,0,-1,0,0,0,-1.5, ldraw_lib__1_4chrd()],
// 1 16 36.5 0 -4.5 1.5 0 0 0 -1 0 0 0 -1.5 1-4chrd.dat
  [1,16,36.5,0,-4.5,1.5,0,0,0,-1,0,0,0,-1.5, ldraw_lib__1_4chrd()],
// 1 16 -36.5 -.25 4.5 -1.5 0 0 0 .25 0 0 0 1.5 1-4cyli.dat
  [1,16,-36.5,-.25,4.5,-1.5,0,0,0,.25,0,0,0,1.5, ldraw_lib__1_4cyli()],
// 1 16 36.5 -.25 4.5 1.5 0 0 0 .25 0 0 0 1.5 1-4cyli.dat
  [1,16,36.5,-.25,4.5,1.5,0,0,0,.25,0,0,0,1.5, ldraw_lib__1_4cyli()],
// 1 16 -36.5 -.25 -4.5 -1.5 0 0 0 .25 0 0 0 -1.5 1-4cyli.dat
  [1,16,-36.5,-.25,-4.5,-1.5,0,0,0,.25,0,0,0,-1.5, ldraw_lib__1_4cyli()],
// 1 16 36.5 -.25 -4.5 1.5 0 0 0 .25 0 0 0 -1.5 1-4cyli.dat
  [1,16,36.5,-.25,-4.5,1.5,0,0,0,.25,0,0,0,-1.5, ldraw_lib__1_4cyli()],
// 1 0 -36.5 -.25 4.5 -1.5 0 0 0 1 0 0 0 1.5 1-4chrd.dat
  [1,0,-36.5,-.25,4.5,-1.5,0,0,0,1,0,0,0,1.5, ldraw_lib__1_4chrd()],
// 1 0 36.5 -.25 4.5 1.5 0 0 0 1 0 0 0 1.5 1-4chrd.dat
  [1,0,36.5,-.25,4.5,1.5,0,0,0,1,0,0,0,1.5, ldraw_lib__1_4chrd()],
// 1 4 -36.5 -.25 -4.5 -1.5 0 0 0 1 0 0 0 -1.5 1-4chrd.dat
  [1,4,-36.5,-.25,-4.5,-1.5,0,0,0,1,0,0,0,-1.5, ldraw_lib__1_4chrd()],
// 1 4 36.5 -.25 -4.5 1.5 0 0 0 1 0 0 0 -1.5 1-4chrd.dat
  [1,4,36.5,-.25,-4.5,1.5,0,0,0,1,0,0,0,-1.5, ldraw_lib__1_4chrd()],
// 0 // Bottom face
// 4 16 -36.5 0 6 -36.5 0 -6 -38 0 -4.5 -38 0 4.5
  [4,16,-36.5,0,6,-36.5,0,-6,-38,0,-4.5,-38,0,4.5],
// 4 16 36.5 0 6 38 0 4.5 38 0 -4.5 36.5 0 -6
  [4,16,36.5,0,6,38,0,4.5,38,0,-4.5,36.5,0,-6],
// 0 // Lateral face
// 3 16 -38 0 4.5 -38 -.25 -1.7 -38 -.25 4.5
  [3,16,-38,0,4.5,-38,-.25,-1.7,-38,-.25,4.5],
// 4 16 -38 0 4.5 -38 0 -4.5 -38 -.25 -4.5 -38 -.25 -1.7
  [4,16,-38,0,4.5,-38,0,-4.5,-38,-.25,-4.5,-38,-.25,-1.7],
// 3 16 38 0 4.5 38 -.25 4.5 38 -.25 3
  [3,16,38,0,4.5,38,-.25,4.5,38,-.25,3],
// 4 16 38 0 4.5 38 -.25 3 38 -.25 -4.5 38 0 -4.5
  [4,16,38,0,4.5,38,-.25,3,38,-.25,-4.5,38,0,-4.5],
// 0 // Top face
// 0 // Black faces
// 4 0 -36.5 -.25 6 -38 -.25 4.5 -38 -.25 -1.7 -34.5012 -.25 -.2787
  [4,0,-36.5,-.25,6,-38,-.25,4.5,-38,-.25,-1.7,-34.5012,-.25,-.2787],
// 3 0 -36.5 -.25 6 -34.5012 -.25 -.2787 -30.9114 -.25 .8939
  [3,0,-36.5,-.25,6,-34.5012,-.25,-.2787,-30.9114,-.25,.8939],
// 3 0 -36.5 -.25 6 -30.9114 -.25 .8939 -27.2482 -.25 1.8119
  [3,0,-36.5,-.25,6,-30.9114,-.25,.8939,-27.2482,-.25,1.8119],
// 3 0 -36.5 -.25 6 -27.2482 -.25 1.8119 -23.5297 -.25 2.4709
  [3,0,-36.5,-.25,6,-27.2482,-.25,1.8119,-23.5297,-.25,2.4709],
// 3 0 -36.5 -.25 6 -23.5297 -.25 2.4709 -19.7741 -.25 2.8676
  [3,0,-36.5,-.25,6,-23.5297,-.25,2.4709,-19.7741,-.25,2.8676],
// 3 0 -36.5 -.25 6 -19.7741 -.25 2.8676 -16 -.25 3
  [3,0,-36.5,-.25,6,-19.7741,-.25,2.8676,-16,-.25,3],
// 3 0 -36.5 -.25 6 -16 -.25 3 38 -.25 3
  [3,0,-36.5,-.25,6,-16,-.25,3,38,-.25,3],
// 4 0 -36.5 -.25 6 38 -.25 3 38 -.25 4.5 36.5 -.25 6
  [4,0,-36.5,-.25,6,38,-.25,3,38,-.25,4.5,36.5,-.25,6],
// 0 // Red faces
// 4 4 36.5 -.25 -6 -38 -.25 -1.7 -38 -.25 -4.5 -36.5 -.25 -6
  [4,4,36.5,-.25,-6,-38,-.25,-1.7,-38,-.25,-4.5,-36.5,-.25,-6],
// 4 4 36.5 -.25 -6 -30.9114 -.25 .8939 -34.5012 -.25 -.2787 -38 -.25 -1.7
  [4,4,36.5,-.25,-6,-30.9114,-.25,.8939,-34.5012,-.25,-.2787,-38,-.25,-1.7],
// 4 4 36.5 -.25 -6 -23.5297 -.25 2.4709 -27.2482 -.25 1.8119 -30.9114 -.25 .8939
  [4,4,36.5,-.25,-6,-23.5297,-.25,2.4709,-27.2482,-.25,1.8119,-30.9114,-.25,.8939],
// 4 4 36.5 -.25 -6 -16 -.25 3 -19.7741 -.25 2.8676 -23.5297 -.25 2.4709
  [4,4,36.5,-.25,-6,-16,-.25,3,-19.7741,-.25,2.8676,-23.5297,-.25,2.4709],
// 4 4 36.5 -.25 -6 38 -.25 -4.5 38 -.25 3 -16 -.25 3
  [4,4,36.5,-.25,-6,38,-.25,-4.5,38,-.25,3,-16,-.25,3],
];
module ldraw_lib__6221655r(step=0, col=false, unit=2/5, alt=false, line=0.2, solid=!$preview)
    makepoly(ldraw_lib__6221655r(), step=step, col=col, unit=unit, alt=alt, line=line, solid=solid);
ldraw_lib__6221655r(line=0.2);
// file: 30413.scad
use <../lib.scad>
use <../p/1-4cylo.scad>
use <../p/1-4disc.scad>
use <../p/box2-5.scad>
use <../p/box5.scad>
use <../p/stud3.scad>
$fa=1; $fs=0.2;
function ldraw_lib__30413(realsolid=false) = [
// 0 Panel  1 x  4 x  1 with Rounded Corners, Thick Wall
// 0 Name: 30413.dat
// 0 Author: R. M. Rodinsky [dublar]
// 0 !LDRAW_ORG Part UPDATE 2019-02
// 0 !LICENSE Licensed under CC BY 2.0 and CC BY 4.0 : see CAreadme.txt
// 
// 0 BFC CERTIFY CCW
  [0,"BFC","CERTIFY"],
  [0,"BFC","CCW"],
// 
// 0 !HISTORY 2002-04-25 [PTadmin] Official Update 2002-02
// 0 !HISTORY 2007-06-09 [PTadmin] Header formatted for Contributor Agreement
// 0 !HISTORY 2008-07-01 [PTadmin] Official Update 2008-01
// 0 !HISTORY 2008-07-07 [mikeheide] BFC'd (2007-08-15)
// 0 !HISTORY 2009-09-03 [PTadmin] Official Update 2009-02
// 0 !HISTORY 2012-06-03 [C3POwen] Complete rewrite; added rounded corners
// 0 !HISTORY 2012-08-09 [PTadmin] Official Update 2012-02
// 0 !HISTORY 2019-08-31 [cwdee] Further qualify description
// 0 !HISTORY 2019-09-09 [PTadmin] Official Update 2019-02
// 
// 
// 1 16 0 20 0 1 0 0 0 -1 0 0 0 1 stud3.dat
  [1,16,0,20,0,1,0,0,0,-1,0,0,0,1, ldraw_lib__stud3(realsolid)],
// 1 16 -20 20 0 1 0 0 0 -1 0 0 0 1 stud3.dat
  [1,16,-20,20,0,1,0,0,0,-1,0,0,0,1, ldraw_lib__stud3(realsolid)],
// 1 16 20 20 0 1 0 0 0 -1 0 0 0 1 stud3.dat
  [1,16,20,20,0,1,0,0,0,-1,0,0,0,1, ldraw_lib__stud3(realsolid)],
// 0 BFC INVERTNEXT
  [0,"BFC","INVERTNEXT"],
// 1 16 0 24 0 36 0 0 0 -4 0 0 0 6 box5.dat
  [1,16,0,24,0,36,0,0,0,-4,0,0,0,6, ldraw_lib__box5(realsolid)],
// 4 16 40 24 10 36 24 6 -36 24 6 -40 24 10
  [4,16,40,24,10,36,24,6,-36,24,6,-40,24,10],
// 4 16 -40 24 10 -36 24 6 -36 24 -6 -40 24 -10
  [4,16,-40,24,10,-36,24,6,-36,24,-6,-40,24,-10],
// 4 16 -40 24 -10 -36 24 -6 36 24 -6 40 24 -10
  [4,16,-40,24,-10,-36,24,-6,36,24,-6,40,24,-10],
// 4 16 40 24 -10 36 24 -6 36 24 6 40 24 10
  [4,16,40,24,-10,36,24,-6,36,24,6,40,24,10],
// 2 24 40 24 10 -40 24 10
  [2,24,40,24,10,-40,24,10],
// 2 24 -40 24 10 -40 24 -10
  [2,24,-40,24,10,-40,24,-10],
// 2 24 40 24 -10 40 24 10
  [2,24,40,24,-10,40,24,10],
// 2 24 40 2 6 40 16 6
  [2,24,40,2,6,40,16,6],
// 2 24 -40 2 6 -40 16 6
  [2,24,-40,2,6,-40,16,6],
// 2 24 40 2 10 40 24 10
  [2,24,40,2,10,40,24,10],
// 2 24 -40 2 10 -40 24 10
  [2,24,-40,2,10,-40,24,10],
// 2 24 38 0 10 -38 0 10
  [2,24,38,0,10,-38,0,10],
// 2 24 -38 0 6 38 0 6
  [2,24,-38,0,6,38,0,6],
// 4 16 -40 24 10 -40 24 -10 -40 16 -10 -40 16 6
  [4,16,-40,24,10,-40,24,-10,-40,16,-10,-40,16,6],
// 4 16 40 24 -10 40 24 10 40 16 6 40 16 -10
  [4,16,40,24,-10,40,24,10,40,16,6,40,16,-10],
// 4 16 -40 24 10 -40 16 6 -40 2 6 -40 2 10
  [4,16,-40,24,10,-40,16,6,-40,2,6,-40,2,10],
// 4 16 40 16 6 40 24 10 40 2 10 40 2 6
  [4,16,40,16,6,40,24,10,40,2,10,40,2,6],
// 4 16 40 24 10 -40 24 10 -38 2 10 38 2 10
  [4,16,40,24,10,-40,24,10,-38,2,10,38,2,10],
// 4 16 38 2 10 -38 2 10 -38 0 10 38 0 10
  [4,16,38,2,10,-38,2,10,-38,0,10,38,0,10],
// 3 16 40 24 10 38 2 10 40 2 10
  [3,16,40,24,10,38,2,10,40,2,10],
// 3 16 -40 24 10 -40 2 10 -38 2 10
  [3,16,-40,24,10,-40,2,10,-38,2,10],
// 4 16 -40 16 6 40 16 6 38 2 6 -38 2 6
  [4,16,-40,16,6,40,16,6,38,2,6,-38,2,6],
// 4 16 -38 2 6 38 2 6 38 0 6 -38 0 6
  [4,16,-38,2,6,38,2,6,38,0,6,-38,0,6],
// 3 16 40 16 6 40 2 6 38 2 6
  [3,16,40,16,6,40,2,6,38,2,6],
// 3 16 -40 16 6 -38 2 6 -40 2 6
  [3,16,-40,16,6,-38,2,6,-40,2,6],
// 4 16 38 0 6 38 0 10 -38 0 10 -38 0 6
  [4,16,38,0,6,38,0,10,-38,0,10,-38,0,6],
// 1 16 38 2 6 2 0 0 0 0 -2 0 2 0 1-4disc.dat
  [1,16,38,2,6,2,0,0,0,0,-2,0,2,0, ldraw_lib__1_4disc(realsolid)],
// 1 16 38 2 10 2 0 0 0 0 -2 0 -2 0 1-4disc.dat
  [1,16,38,2,10,2,0,0,0,0,-2,0,-2,0, ldraw_lib__1_4disc(realsolid)],
// 1 16 -38 2 10 -2 0 0 0 0 -2 0 -2 0 1-4disc.dat
  [1,16,-38,2,10,-2,0,0,0,0,-2,0,-2,0, ldraw_lib__1_4disc(realsolid)],
// 1 16 -38 2 6 -2 0 0 0 0 -2 0 2 0 1-4disc.dat
  [1,16,-38,2,6,-2,0,0,0,0,-2,0,2,0, ldraw_lib__1_4disc(realsolid)],
// 1 16 38 2 6 2 0 0 0 0 -2 0 4 0 1-4cylo.dat
  [1,16,38,2,6,2,0,0,0,0,-2,0,4,0, ldraw_lib__1_4cylo(realsolid)],
// 1 16 -38 2 10 -2 0 0 0 0 -2 0 -4 0 1-4cylo.dat
  [1,16,-38,2,10,-2,0,0,0,0,-2,0,-4,0, ldraw_lib__1_4cylo(realsolid)],
// 1 16 0 20 -2 -40 0 0 0 -4 0 0 0 -8 box2-5.dat
  [1,16,0,20,-2,-40,0,0,0,-4,0,0,0,-8, ldraw_lib__box2_5(realsolid)],
];
module ldraw_lib__30413(step=0, col=false, unit=2/5, alt=false, line=0.2, solid=!$preview)
    makepoly(ldraw_lib__30413(solid), step=step, col=col, unit=unit, alt=alt, line=line, solid=solid);
ldraw_lib__30413(line=0.2);
// main file
use <../lib.scad>
use <30413.scad>
use <6221655r.scad>
function ldraw_lib__30413d07() = [
// 0 Panel  1 x  4 x  1 with Red Stripe on Black Background Right Sticker
// 0 Name: 30413d07.dat
// 0 Author: Alfred Schmitz [AlfredS]
// 0 !LDRAW_ORG Shortcut UPDATE 2026-09
// 0 !LICENSE Licensed under CC BY 4.0 : see CAreadme.txt
// 
// 0 BFC CERTIFY CCW
  [0,"BFC","CERTIFY"],
  [0,"BFC","CCW"],
// 
// 0 !CATEGORY Sticker Shortcut
// 0 !KEYWORDS 911 RSR, Porsche, Set 75888, Speed Champions, Turbo
// 
// 0 !HISTORY 2026-09-30 [OrionP] Official Update 2026-09
// 
// 1 16 0 0 0 1 0 0 0 1 0 0 0 1 30413.dat
  [1,16,0,0,0,1,0,0,0,1,0,0,0,1, ldraw_lib__30413()],
// 1 16 0 16 -2 1 0 0 0 1 0 0 0 1 6221655r.dat
  [1,16,0,16,-2,1,0,0,0,1,0,0,0,1, ldraw_lib__6221655r()],
];
module ldraw_lib__30413d07(step=0, col=false, unit=2/5, alt=false, line=0.2, solid=!$preview)
    makepoly(ldraw_lib__30413d07(), step=step, col=col, unit=unit, alt=alt, line=line, solid=solid);
ldraw_lib__30413d07(line=0.2);
